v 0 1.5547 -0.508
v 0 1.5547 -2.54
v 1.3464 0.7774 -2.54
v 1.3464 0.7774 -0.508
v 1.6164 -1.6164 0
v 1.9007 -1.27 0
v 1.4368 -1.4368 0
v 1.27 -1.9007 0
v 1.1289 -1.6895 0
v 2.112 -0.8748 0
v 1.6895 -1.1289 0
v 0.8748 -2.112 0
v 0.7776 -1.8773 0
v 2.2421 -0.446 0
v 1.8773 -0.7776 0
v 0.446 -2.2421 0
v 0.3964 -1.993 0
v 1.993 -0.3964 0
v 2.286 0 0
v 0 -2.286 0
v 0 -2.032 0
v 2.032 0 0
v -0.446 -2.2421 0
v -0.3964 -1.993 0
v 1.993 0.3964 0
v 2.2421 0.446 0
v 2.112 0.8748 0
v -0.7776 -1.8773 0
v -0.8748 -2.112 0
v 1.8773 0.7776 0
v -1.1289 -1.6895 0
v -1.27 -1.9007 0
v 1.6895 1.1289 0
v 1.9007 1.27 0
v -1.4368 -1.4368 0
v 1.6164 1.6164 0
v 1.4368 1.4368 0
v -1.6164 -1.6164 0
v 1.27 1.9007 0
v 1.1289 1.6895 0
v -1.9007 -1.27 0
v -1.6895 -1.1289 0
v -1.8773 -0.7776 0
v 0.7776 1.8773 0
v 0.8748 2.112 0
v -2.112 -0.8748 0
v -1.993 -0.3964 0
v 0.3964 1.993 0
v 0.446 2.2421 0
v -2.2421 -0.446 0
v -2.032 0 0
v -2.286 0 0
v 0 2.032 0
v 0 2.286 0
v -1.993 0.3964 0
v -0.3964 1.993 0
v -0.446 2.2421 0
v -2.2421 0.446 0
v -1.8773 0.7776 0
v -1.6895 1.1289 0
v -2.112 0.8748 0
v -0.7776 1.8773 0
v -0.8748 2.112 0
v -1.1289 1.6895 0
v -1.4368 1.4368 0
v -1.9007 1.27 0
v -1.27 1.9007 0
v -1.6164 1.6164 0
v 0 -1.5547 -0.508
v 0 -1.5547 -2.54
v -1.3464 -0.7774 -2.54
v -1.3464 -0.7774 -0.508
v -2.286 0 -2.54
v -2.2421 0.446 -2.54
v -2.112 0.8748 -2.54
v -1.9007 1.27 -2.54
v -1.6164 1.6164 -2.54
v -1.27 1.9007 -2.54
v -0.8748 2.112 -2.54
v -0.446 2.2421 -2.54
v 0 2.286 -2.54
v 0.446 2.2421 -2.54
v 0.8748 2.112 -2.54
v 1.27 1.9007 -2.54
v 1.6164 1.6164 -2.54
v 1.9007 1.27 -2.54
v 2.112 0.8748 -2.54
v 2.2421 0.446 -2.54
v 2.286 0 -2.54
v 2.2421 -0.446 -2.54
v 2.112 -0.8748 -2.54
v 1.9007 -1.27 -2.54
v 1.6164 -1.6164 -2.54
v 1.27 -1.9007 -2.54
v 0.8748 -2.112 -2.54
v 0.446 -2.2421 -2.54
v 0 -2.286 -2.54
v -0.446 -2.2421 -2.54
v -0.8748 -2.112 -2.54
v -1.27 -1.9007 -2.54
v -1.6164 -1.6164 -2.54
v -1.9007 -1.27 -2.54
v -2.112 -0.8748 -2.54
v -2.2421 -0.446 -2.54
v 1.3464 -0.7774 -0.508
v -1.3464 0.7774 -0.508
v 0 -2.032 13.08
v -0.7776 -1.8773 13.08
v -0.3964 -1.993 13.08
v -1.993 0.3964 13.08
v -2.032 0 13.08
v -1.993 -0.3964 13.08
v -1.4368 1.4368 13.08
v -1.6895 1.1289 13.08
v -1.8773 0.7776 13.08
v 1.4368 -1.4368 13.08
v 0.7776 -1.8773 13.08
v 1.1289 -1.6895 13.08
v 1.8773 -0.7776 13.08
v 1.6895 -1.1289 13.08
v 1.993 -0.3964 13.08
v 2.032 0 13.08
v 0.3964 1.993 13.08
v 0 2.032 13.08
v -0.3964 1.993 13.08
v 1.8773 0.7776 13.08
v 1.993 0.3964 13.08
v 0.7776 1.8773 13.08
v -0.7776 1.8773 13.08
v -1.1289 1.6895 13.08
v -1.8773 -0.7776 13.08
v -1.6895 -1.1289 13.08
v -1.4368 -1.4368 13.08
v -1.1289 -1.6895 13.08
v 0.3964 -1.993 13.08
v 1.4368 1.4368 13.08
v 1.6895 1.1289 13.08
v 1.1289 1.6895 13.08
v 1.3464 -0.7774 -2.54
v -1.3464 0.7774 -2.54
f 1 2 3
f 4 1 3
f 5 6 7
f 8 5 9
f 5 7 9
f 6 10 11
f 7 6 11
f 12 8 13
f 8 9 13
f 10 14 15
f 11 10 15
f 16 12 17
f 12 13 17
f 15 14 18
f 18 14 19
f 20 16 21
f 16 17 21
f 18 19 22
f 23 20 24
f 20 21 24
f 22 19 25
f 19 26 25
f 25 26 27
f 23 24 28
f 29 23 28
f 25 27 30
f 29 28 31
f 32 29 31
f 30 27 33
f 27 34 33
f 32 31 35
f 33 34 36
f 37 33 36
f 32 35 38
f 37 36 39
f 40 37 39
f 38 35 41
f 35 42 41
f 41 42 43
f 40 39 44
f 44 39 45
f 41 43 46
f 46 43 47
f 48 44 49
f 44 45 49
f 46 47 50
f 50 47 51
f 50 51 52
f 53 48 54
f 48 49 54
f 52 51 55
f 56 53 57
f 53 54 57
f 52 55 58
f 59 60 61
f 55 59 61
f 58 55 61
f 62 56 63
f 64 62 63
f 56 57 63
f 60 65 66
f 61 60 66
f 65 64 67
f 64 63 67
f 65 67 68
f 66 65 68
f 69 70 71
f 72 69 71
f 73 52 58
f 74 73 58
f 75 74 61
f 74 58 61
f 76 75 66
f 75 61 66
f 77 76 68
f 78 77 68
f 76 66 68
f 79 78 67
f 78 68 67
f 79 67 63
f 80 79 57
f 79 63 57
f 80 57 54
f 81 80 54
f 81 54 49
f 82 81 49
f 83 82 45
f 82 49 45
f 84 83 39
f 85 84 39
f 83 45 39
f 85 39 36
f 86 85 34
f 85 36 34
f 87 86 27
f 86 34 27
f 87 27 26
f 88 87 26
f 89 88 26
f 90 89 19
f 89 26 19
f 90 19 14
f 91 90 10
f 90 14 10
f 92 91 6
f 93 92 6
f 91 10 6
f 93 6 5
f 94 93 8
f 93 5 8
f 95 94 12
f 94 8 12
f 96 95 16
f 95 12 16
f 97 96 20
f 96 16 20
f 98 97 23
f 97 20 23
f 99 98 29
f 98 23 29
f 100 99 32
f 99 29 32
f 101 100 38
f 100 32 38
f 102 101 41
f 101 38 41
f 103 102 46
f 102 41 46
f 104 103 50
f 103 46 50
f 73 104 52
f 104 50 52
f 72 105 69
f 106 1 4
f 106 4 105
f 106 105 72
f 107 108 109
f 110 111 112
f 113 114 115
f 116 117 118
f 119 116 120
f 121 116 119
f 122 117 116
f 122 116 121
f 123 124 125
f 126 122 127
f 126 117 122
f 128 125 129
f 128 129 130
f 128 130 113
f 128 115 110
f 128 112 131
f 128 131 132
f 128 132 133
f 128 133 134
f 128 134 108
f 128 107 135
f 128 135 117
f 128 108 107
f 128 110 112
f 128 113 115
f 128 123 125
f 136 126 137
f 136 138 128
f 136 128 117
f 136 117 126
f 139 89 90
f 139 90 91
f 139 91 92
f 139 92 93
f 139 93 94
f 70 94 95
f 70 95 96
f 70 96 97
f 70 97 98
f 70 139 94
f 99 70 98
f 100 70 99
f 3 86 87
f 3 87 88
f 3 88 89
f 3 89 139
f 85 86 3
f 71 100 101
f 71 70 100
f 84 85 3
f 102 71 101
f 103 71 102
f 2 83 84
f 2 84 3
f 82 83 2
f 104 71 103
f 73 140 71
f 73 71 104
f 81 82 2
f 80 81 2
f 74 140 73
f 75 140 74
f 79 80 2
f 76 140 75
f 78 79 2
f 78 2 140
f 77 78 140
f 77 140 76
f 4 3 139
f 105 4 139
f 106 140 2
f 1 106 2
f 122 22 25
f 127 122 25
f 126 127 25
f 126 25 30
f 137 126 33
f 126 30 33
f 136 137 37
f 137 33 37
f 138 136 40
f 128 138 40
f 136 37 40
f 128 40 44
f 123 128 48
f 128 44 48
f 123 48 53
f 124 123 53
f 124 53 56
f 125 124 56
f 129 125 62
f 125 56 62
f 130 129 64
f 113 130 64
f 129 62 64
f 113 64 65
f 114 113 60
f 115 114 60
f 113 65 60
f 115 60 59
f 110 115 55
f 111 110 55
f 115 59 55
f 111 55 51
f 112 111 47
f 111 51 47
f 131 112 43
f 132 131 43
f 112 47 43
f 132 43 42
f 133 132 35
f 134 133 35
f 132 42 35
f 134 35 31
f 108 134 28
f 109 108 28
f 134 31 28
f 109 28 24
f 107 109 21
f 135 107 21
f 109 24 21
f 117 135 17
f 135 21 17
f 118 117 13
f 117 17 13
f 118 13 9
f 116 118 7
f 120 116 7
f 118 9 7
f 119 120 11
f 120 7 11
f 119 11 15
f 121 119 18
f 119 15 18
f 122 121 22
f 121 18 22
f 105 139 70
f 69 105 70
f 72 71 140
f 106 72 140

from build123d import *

# Parameters (mm, degrees)
SKETCH1_R           = 2.032
BOSS_EXTRUDE1_DEPTH = 13.08
SKETCH2_R           = 2.286
BOSS_EXTRUDE2_DEPTH = 2.54
CUT_EXTRUDE1_DEPTH  = 2.032


with BuildPart() as part:
    # Sketch1 → Boss-Extrude1 (new body)
    with BuildSketch(Plane.XY):
        Circle(SKETCH1_R)
    extrude(amount=BOSS_EXTRUDE1_DEPTH)

    # Sketch2 → Boss-Extrude2 (add)
    with BuildSketch(Plane(origin=(0, 0, 0), x_dir=(-1, 0, 0), z_dir=(0, 0, -1))):
        Circle(SKETCH2_R)
    extrude(amount=BOSS_EXTRUDE2_DEPTH)

    # Sketch3 → Cut-Extrude1 (cut)
    with BuildSketch(Plane(origin=(0, 0, -2.54), x_dir=(-1, 0, 0), z_dir=(0, 0, -1))):
        Polygon((0, -1.554742097), (1.346446152, -0.777371048), (1.346446152, 0.777371048), (0, 1.554742097), (-1.346446152, 0.777371048), (-1.346446152, -0.777371048), align=None)
    extrude(amount=-CUT_EXTRUDE1_DEPTH, mode=Mode.SUBTRACT)


solid = part.part
